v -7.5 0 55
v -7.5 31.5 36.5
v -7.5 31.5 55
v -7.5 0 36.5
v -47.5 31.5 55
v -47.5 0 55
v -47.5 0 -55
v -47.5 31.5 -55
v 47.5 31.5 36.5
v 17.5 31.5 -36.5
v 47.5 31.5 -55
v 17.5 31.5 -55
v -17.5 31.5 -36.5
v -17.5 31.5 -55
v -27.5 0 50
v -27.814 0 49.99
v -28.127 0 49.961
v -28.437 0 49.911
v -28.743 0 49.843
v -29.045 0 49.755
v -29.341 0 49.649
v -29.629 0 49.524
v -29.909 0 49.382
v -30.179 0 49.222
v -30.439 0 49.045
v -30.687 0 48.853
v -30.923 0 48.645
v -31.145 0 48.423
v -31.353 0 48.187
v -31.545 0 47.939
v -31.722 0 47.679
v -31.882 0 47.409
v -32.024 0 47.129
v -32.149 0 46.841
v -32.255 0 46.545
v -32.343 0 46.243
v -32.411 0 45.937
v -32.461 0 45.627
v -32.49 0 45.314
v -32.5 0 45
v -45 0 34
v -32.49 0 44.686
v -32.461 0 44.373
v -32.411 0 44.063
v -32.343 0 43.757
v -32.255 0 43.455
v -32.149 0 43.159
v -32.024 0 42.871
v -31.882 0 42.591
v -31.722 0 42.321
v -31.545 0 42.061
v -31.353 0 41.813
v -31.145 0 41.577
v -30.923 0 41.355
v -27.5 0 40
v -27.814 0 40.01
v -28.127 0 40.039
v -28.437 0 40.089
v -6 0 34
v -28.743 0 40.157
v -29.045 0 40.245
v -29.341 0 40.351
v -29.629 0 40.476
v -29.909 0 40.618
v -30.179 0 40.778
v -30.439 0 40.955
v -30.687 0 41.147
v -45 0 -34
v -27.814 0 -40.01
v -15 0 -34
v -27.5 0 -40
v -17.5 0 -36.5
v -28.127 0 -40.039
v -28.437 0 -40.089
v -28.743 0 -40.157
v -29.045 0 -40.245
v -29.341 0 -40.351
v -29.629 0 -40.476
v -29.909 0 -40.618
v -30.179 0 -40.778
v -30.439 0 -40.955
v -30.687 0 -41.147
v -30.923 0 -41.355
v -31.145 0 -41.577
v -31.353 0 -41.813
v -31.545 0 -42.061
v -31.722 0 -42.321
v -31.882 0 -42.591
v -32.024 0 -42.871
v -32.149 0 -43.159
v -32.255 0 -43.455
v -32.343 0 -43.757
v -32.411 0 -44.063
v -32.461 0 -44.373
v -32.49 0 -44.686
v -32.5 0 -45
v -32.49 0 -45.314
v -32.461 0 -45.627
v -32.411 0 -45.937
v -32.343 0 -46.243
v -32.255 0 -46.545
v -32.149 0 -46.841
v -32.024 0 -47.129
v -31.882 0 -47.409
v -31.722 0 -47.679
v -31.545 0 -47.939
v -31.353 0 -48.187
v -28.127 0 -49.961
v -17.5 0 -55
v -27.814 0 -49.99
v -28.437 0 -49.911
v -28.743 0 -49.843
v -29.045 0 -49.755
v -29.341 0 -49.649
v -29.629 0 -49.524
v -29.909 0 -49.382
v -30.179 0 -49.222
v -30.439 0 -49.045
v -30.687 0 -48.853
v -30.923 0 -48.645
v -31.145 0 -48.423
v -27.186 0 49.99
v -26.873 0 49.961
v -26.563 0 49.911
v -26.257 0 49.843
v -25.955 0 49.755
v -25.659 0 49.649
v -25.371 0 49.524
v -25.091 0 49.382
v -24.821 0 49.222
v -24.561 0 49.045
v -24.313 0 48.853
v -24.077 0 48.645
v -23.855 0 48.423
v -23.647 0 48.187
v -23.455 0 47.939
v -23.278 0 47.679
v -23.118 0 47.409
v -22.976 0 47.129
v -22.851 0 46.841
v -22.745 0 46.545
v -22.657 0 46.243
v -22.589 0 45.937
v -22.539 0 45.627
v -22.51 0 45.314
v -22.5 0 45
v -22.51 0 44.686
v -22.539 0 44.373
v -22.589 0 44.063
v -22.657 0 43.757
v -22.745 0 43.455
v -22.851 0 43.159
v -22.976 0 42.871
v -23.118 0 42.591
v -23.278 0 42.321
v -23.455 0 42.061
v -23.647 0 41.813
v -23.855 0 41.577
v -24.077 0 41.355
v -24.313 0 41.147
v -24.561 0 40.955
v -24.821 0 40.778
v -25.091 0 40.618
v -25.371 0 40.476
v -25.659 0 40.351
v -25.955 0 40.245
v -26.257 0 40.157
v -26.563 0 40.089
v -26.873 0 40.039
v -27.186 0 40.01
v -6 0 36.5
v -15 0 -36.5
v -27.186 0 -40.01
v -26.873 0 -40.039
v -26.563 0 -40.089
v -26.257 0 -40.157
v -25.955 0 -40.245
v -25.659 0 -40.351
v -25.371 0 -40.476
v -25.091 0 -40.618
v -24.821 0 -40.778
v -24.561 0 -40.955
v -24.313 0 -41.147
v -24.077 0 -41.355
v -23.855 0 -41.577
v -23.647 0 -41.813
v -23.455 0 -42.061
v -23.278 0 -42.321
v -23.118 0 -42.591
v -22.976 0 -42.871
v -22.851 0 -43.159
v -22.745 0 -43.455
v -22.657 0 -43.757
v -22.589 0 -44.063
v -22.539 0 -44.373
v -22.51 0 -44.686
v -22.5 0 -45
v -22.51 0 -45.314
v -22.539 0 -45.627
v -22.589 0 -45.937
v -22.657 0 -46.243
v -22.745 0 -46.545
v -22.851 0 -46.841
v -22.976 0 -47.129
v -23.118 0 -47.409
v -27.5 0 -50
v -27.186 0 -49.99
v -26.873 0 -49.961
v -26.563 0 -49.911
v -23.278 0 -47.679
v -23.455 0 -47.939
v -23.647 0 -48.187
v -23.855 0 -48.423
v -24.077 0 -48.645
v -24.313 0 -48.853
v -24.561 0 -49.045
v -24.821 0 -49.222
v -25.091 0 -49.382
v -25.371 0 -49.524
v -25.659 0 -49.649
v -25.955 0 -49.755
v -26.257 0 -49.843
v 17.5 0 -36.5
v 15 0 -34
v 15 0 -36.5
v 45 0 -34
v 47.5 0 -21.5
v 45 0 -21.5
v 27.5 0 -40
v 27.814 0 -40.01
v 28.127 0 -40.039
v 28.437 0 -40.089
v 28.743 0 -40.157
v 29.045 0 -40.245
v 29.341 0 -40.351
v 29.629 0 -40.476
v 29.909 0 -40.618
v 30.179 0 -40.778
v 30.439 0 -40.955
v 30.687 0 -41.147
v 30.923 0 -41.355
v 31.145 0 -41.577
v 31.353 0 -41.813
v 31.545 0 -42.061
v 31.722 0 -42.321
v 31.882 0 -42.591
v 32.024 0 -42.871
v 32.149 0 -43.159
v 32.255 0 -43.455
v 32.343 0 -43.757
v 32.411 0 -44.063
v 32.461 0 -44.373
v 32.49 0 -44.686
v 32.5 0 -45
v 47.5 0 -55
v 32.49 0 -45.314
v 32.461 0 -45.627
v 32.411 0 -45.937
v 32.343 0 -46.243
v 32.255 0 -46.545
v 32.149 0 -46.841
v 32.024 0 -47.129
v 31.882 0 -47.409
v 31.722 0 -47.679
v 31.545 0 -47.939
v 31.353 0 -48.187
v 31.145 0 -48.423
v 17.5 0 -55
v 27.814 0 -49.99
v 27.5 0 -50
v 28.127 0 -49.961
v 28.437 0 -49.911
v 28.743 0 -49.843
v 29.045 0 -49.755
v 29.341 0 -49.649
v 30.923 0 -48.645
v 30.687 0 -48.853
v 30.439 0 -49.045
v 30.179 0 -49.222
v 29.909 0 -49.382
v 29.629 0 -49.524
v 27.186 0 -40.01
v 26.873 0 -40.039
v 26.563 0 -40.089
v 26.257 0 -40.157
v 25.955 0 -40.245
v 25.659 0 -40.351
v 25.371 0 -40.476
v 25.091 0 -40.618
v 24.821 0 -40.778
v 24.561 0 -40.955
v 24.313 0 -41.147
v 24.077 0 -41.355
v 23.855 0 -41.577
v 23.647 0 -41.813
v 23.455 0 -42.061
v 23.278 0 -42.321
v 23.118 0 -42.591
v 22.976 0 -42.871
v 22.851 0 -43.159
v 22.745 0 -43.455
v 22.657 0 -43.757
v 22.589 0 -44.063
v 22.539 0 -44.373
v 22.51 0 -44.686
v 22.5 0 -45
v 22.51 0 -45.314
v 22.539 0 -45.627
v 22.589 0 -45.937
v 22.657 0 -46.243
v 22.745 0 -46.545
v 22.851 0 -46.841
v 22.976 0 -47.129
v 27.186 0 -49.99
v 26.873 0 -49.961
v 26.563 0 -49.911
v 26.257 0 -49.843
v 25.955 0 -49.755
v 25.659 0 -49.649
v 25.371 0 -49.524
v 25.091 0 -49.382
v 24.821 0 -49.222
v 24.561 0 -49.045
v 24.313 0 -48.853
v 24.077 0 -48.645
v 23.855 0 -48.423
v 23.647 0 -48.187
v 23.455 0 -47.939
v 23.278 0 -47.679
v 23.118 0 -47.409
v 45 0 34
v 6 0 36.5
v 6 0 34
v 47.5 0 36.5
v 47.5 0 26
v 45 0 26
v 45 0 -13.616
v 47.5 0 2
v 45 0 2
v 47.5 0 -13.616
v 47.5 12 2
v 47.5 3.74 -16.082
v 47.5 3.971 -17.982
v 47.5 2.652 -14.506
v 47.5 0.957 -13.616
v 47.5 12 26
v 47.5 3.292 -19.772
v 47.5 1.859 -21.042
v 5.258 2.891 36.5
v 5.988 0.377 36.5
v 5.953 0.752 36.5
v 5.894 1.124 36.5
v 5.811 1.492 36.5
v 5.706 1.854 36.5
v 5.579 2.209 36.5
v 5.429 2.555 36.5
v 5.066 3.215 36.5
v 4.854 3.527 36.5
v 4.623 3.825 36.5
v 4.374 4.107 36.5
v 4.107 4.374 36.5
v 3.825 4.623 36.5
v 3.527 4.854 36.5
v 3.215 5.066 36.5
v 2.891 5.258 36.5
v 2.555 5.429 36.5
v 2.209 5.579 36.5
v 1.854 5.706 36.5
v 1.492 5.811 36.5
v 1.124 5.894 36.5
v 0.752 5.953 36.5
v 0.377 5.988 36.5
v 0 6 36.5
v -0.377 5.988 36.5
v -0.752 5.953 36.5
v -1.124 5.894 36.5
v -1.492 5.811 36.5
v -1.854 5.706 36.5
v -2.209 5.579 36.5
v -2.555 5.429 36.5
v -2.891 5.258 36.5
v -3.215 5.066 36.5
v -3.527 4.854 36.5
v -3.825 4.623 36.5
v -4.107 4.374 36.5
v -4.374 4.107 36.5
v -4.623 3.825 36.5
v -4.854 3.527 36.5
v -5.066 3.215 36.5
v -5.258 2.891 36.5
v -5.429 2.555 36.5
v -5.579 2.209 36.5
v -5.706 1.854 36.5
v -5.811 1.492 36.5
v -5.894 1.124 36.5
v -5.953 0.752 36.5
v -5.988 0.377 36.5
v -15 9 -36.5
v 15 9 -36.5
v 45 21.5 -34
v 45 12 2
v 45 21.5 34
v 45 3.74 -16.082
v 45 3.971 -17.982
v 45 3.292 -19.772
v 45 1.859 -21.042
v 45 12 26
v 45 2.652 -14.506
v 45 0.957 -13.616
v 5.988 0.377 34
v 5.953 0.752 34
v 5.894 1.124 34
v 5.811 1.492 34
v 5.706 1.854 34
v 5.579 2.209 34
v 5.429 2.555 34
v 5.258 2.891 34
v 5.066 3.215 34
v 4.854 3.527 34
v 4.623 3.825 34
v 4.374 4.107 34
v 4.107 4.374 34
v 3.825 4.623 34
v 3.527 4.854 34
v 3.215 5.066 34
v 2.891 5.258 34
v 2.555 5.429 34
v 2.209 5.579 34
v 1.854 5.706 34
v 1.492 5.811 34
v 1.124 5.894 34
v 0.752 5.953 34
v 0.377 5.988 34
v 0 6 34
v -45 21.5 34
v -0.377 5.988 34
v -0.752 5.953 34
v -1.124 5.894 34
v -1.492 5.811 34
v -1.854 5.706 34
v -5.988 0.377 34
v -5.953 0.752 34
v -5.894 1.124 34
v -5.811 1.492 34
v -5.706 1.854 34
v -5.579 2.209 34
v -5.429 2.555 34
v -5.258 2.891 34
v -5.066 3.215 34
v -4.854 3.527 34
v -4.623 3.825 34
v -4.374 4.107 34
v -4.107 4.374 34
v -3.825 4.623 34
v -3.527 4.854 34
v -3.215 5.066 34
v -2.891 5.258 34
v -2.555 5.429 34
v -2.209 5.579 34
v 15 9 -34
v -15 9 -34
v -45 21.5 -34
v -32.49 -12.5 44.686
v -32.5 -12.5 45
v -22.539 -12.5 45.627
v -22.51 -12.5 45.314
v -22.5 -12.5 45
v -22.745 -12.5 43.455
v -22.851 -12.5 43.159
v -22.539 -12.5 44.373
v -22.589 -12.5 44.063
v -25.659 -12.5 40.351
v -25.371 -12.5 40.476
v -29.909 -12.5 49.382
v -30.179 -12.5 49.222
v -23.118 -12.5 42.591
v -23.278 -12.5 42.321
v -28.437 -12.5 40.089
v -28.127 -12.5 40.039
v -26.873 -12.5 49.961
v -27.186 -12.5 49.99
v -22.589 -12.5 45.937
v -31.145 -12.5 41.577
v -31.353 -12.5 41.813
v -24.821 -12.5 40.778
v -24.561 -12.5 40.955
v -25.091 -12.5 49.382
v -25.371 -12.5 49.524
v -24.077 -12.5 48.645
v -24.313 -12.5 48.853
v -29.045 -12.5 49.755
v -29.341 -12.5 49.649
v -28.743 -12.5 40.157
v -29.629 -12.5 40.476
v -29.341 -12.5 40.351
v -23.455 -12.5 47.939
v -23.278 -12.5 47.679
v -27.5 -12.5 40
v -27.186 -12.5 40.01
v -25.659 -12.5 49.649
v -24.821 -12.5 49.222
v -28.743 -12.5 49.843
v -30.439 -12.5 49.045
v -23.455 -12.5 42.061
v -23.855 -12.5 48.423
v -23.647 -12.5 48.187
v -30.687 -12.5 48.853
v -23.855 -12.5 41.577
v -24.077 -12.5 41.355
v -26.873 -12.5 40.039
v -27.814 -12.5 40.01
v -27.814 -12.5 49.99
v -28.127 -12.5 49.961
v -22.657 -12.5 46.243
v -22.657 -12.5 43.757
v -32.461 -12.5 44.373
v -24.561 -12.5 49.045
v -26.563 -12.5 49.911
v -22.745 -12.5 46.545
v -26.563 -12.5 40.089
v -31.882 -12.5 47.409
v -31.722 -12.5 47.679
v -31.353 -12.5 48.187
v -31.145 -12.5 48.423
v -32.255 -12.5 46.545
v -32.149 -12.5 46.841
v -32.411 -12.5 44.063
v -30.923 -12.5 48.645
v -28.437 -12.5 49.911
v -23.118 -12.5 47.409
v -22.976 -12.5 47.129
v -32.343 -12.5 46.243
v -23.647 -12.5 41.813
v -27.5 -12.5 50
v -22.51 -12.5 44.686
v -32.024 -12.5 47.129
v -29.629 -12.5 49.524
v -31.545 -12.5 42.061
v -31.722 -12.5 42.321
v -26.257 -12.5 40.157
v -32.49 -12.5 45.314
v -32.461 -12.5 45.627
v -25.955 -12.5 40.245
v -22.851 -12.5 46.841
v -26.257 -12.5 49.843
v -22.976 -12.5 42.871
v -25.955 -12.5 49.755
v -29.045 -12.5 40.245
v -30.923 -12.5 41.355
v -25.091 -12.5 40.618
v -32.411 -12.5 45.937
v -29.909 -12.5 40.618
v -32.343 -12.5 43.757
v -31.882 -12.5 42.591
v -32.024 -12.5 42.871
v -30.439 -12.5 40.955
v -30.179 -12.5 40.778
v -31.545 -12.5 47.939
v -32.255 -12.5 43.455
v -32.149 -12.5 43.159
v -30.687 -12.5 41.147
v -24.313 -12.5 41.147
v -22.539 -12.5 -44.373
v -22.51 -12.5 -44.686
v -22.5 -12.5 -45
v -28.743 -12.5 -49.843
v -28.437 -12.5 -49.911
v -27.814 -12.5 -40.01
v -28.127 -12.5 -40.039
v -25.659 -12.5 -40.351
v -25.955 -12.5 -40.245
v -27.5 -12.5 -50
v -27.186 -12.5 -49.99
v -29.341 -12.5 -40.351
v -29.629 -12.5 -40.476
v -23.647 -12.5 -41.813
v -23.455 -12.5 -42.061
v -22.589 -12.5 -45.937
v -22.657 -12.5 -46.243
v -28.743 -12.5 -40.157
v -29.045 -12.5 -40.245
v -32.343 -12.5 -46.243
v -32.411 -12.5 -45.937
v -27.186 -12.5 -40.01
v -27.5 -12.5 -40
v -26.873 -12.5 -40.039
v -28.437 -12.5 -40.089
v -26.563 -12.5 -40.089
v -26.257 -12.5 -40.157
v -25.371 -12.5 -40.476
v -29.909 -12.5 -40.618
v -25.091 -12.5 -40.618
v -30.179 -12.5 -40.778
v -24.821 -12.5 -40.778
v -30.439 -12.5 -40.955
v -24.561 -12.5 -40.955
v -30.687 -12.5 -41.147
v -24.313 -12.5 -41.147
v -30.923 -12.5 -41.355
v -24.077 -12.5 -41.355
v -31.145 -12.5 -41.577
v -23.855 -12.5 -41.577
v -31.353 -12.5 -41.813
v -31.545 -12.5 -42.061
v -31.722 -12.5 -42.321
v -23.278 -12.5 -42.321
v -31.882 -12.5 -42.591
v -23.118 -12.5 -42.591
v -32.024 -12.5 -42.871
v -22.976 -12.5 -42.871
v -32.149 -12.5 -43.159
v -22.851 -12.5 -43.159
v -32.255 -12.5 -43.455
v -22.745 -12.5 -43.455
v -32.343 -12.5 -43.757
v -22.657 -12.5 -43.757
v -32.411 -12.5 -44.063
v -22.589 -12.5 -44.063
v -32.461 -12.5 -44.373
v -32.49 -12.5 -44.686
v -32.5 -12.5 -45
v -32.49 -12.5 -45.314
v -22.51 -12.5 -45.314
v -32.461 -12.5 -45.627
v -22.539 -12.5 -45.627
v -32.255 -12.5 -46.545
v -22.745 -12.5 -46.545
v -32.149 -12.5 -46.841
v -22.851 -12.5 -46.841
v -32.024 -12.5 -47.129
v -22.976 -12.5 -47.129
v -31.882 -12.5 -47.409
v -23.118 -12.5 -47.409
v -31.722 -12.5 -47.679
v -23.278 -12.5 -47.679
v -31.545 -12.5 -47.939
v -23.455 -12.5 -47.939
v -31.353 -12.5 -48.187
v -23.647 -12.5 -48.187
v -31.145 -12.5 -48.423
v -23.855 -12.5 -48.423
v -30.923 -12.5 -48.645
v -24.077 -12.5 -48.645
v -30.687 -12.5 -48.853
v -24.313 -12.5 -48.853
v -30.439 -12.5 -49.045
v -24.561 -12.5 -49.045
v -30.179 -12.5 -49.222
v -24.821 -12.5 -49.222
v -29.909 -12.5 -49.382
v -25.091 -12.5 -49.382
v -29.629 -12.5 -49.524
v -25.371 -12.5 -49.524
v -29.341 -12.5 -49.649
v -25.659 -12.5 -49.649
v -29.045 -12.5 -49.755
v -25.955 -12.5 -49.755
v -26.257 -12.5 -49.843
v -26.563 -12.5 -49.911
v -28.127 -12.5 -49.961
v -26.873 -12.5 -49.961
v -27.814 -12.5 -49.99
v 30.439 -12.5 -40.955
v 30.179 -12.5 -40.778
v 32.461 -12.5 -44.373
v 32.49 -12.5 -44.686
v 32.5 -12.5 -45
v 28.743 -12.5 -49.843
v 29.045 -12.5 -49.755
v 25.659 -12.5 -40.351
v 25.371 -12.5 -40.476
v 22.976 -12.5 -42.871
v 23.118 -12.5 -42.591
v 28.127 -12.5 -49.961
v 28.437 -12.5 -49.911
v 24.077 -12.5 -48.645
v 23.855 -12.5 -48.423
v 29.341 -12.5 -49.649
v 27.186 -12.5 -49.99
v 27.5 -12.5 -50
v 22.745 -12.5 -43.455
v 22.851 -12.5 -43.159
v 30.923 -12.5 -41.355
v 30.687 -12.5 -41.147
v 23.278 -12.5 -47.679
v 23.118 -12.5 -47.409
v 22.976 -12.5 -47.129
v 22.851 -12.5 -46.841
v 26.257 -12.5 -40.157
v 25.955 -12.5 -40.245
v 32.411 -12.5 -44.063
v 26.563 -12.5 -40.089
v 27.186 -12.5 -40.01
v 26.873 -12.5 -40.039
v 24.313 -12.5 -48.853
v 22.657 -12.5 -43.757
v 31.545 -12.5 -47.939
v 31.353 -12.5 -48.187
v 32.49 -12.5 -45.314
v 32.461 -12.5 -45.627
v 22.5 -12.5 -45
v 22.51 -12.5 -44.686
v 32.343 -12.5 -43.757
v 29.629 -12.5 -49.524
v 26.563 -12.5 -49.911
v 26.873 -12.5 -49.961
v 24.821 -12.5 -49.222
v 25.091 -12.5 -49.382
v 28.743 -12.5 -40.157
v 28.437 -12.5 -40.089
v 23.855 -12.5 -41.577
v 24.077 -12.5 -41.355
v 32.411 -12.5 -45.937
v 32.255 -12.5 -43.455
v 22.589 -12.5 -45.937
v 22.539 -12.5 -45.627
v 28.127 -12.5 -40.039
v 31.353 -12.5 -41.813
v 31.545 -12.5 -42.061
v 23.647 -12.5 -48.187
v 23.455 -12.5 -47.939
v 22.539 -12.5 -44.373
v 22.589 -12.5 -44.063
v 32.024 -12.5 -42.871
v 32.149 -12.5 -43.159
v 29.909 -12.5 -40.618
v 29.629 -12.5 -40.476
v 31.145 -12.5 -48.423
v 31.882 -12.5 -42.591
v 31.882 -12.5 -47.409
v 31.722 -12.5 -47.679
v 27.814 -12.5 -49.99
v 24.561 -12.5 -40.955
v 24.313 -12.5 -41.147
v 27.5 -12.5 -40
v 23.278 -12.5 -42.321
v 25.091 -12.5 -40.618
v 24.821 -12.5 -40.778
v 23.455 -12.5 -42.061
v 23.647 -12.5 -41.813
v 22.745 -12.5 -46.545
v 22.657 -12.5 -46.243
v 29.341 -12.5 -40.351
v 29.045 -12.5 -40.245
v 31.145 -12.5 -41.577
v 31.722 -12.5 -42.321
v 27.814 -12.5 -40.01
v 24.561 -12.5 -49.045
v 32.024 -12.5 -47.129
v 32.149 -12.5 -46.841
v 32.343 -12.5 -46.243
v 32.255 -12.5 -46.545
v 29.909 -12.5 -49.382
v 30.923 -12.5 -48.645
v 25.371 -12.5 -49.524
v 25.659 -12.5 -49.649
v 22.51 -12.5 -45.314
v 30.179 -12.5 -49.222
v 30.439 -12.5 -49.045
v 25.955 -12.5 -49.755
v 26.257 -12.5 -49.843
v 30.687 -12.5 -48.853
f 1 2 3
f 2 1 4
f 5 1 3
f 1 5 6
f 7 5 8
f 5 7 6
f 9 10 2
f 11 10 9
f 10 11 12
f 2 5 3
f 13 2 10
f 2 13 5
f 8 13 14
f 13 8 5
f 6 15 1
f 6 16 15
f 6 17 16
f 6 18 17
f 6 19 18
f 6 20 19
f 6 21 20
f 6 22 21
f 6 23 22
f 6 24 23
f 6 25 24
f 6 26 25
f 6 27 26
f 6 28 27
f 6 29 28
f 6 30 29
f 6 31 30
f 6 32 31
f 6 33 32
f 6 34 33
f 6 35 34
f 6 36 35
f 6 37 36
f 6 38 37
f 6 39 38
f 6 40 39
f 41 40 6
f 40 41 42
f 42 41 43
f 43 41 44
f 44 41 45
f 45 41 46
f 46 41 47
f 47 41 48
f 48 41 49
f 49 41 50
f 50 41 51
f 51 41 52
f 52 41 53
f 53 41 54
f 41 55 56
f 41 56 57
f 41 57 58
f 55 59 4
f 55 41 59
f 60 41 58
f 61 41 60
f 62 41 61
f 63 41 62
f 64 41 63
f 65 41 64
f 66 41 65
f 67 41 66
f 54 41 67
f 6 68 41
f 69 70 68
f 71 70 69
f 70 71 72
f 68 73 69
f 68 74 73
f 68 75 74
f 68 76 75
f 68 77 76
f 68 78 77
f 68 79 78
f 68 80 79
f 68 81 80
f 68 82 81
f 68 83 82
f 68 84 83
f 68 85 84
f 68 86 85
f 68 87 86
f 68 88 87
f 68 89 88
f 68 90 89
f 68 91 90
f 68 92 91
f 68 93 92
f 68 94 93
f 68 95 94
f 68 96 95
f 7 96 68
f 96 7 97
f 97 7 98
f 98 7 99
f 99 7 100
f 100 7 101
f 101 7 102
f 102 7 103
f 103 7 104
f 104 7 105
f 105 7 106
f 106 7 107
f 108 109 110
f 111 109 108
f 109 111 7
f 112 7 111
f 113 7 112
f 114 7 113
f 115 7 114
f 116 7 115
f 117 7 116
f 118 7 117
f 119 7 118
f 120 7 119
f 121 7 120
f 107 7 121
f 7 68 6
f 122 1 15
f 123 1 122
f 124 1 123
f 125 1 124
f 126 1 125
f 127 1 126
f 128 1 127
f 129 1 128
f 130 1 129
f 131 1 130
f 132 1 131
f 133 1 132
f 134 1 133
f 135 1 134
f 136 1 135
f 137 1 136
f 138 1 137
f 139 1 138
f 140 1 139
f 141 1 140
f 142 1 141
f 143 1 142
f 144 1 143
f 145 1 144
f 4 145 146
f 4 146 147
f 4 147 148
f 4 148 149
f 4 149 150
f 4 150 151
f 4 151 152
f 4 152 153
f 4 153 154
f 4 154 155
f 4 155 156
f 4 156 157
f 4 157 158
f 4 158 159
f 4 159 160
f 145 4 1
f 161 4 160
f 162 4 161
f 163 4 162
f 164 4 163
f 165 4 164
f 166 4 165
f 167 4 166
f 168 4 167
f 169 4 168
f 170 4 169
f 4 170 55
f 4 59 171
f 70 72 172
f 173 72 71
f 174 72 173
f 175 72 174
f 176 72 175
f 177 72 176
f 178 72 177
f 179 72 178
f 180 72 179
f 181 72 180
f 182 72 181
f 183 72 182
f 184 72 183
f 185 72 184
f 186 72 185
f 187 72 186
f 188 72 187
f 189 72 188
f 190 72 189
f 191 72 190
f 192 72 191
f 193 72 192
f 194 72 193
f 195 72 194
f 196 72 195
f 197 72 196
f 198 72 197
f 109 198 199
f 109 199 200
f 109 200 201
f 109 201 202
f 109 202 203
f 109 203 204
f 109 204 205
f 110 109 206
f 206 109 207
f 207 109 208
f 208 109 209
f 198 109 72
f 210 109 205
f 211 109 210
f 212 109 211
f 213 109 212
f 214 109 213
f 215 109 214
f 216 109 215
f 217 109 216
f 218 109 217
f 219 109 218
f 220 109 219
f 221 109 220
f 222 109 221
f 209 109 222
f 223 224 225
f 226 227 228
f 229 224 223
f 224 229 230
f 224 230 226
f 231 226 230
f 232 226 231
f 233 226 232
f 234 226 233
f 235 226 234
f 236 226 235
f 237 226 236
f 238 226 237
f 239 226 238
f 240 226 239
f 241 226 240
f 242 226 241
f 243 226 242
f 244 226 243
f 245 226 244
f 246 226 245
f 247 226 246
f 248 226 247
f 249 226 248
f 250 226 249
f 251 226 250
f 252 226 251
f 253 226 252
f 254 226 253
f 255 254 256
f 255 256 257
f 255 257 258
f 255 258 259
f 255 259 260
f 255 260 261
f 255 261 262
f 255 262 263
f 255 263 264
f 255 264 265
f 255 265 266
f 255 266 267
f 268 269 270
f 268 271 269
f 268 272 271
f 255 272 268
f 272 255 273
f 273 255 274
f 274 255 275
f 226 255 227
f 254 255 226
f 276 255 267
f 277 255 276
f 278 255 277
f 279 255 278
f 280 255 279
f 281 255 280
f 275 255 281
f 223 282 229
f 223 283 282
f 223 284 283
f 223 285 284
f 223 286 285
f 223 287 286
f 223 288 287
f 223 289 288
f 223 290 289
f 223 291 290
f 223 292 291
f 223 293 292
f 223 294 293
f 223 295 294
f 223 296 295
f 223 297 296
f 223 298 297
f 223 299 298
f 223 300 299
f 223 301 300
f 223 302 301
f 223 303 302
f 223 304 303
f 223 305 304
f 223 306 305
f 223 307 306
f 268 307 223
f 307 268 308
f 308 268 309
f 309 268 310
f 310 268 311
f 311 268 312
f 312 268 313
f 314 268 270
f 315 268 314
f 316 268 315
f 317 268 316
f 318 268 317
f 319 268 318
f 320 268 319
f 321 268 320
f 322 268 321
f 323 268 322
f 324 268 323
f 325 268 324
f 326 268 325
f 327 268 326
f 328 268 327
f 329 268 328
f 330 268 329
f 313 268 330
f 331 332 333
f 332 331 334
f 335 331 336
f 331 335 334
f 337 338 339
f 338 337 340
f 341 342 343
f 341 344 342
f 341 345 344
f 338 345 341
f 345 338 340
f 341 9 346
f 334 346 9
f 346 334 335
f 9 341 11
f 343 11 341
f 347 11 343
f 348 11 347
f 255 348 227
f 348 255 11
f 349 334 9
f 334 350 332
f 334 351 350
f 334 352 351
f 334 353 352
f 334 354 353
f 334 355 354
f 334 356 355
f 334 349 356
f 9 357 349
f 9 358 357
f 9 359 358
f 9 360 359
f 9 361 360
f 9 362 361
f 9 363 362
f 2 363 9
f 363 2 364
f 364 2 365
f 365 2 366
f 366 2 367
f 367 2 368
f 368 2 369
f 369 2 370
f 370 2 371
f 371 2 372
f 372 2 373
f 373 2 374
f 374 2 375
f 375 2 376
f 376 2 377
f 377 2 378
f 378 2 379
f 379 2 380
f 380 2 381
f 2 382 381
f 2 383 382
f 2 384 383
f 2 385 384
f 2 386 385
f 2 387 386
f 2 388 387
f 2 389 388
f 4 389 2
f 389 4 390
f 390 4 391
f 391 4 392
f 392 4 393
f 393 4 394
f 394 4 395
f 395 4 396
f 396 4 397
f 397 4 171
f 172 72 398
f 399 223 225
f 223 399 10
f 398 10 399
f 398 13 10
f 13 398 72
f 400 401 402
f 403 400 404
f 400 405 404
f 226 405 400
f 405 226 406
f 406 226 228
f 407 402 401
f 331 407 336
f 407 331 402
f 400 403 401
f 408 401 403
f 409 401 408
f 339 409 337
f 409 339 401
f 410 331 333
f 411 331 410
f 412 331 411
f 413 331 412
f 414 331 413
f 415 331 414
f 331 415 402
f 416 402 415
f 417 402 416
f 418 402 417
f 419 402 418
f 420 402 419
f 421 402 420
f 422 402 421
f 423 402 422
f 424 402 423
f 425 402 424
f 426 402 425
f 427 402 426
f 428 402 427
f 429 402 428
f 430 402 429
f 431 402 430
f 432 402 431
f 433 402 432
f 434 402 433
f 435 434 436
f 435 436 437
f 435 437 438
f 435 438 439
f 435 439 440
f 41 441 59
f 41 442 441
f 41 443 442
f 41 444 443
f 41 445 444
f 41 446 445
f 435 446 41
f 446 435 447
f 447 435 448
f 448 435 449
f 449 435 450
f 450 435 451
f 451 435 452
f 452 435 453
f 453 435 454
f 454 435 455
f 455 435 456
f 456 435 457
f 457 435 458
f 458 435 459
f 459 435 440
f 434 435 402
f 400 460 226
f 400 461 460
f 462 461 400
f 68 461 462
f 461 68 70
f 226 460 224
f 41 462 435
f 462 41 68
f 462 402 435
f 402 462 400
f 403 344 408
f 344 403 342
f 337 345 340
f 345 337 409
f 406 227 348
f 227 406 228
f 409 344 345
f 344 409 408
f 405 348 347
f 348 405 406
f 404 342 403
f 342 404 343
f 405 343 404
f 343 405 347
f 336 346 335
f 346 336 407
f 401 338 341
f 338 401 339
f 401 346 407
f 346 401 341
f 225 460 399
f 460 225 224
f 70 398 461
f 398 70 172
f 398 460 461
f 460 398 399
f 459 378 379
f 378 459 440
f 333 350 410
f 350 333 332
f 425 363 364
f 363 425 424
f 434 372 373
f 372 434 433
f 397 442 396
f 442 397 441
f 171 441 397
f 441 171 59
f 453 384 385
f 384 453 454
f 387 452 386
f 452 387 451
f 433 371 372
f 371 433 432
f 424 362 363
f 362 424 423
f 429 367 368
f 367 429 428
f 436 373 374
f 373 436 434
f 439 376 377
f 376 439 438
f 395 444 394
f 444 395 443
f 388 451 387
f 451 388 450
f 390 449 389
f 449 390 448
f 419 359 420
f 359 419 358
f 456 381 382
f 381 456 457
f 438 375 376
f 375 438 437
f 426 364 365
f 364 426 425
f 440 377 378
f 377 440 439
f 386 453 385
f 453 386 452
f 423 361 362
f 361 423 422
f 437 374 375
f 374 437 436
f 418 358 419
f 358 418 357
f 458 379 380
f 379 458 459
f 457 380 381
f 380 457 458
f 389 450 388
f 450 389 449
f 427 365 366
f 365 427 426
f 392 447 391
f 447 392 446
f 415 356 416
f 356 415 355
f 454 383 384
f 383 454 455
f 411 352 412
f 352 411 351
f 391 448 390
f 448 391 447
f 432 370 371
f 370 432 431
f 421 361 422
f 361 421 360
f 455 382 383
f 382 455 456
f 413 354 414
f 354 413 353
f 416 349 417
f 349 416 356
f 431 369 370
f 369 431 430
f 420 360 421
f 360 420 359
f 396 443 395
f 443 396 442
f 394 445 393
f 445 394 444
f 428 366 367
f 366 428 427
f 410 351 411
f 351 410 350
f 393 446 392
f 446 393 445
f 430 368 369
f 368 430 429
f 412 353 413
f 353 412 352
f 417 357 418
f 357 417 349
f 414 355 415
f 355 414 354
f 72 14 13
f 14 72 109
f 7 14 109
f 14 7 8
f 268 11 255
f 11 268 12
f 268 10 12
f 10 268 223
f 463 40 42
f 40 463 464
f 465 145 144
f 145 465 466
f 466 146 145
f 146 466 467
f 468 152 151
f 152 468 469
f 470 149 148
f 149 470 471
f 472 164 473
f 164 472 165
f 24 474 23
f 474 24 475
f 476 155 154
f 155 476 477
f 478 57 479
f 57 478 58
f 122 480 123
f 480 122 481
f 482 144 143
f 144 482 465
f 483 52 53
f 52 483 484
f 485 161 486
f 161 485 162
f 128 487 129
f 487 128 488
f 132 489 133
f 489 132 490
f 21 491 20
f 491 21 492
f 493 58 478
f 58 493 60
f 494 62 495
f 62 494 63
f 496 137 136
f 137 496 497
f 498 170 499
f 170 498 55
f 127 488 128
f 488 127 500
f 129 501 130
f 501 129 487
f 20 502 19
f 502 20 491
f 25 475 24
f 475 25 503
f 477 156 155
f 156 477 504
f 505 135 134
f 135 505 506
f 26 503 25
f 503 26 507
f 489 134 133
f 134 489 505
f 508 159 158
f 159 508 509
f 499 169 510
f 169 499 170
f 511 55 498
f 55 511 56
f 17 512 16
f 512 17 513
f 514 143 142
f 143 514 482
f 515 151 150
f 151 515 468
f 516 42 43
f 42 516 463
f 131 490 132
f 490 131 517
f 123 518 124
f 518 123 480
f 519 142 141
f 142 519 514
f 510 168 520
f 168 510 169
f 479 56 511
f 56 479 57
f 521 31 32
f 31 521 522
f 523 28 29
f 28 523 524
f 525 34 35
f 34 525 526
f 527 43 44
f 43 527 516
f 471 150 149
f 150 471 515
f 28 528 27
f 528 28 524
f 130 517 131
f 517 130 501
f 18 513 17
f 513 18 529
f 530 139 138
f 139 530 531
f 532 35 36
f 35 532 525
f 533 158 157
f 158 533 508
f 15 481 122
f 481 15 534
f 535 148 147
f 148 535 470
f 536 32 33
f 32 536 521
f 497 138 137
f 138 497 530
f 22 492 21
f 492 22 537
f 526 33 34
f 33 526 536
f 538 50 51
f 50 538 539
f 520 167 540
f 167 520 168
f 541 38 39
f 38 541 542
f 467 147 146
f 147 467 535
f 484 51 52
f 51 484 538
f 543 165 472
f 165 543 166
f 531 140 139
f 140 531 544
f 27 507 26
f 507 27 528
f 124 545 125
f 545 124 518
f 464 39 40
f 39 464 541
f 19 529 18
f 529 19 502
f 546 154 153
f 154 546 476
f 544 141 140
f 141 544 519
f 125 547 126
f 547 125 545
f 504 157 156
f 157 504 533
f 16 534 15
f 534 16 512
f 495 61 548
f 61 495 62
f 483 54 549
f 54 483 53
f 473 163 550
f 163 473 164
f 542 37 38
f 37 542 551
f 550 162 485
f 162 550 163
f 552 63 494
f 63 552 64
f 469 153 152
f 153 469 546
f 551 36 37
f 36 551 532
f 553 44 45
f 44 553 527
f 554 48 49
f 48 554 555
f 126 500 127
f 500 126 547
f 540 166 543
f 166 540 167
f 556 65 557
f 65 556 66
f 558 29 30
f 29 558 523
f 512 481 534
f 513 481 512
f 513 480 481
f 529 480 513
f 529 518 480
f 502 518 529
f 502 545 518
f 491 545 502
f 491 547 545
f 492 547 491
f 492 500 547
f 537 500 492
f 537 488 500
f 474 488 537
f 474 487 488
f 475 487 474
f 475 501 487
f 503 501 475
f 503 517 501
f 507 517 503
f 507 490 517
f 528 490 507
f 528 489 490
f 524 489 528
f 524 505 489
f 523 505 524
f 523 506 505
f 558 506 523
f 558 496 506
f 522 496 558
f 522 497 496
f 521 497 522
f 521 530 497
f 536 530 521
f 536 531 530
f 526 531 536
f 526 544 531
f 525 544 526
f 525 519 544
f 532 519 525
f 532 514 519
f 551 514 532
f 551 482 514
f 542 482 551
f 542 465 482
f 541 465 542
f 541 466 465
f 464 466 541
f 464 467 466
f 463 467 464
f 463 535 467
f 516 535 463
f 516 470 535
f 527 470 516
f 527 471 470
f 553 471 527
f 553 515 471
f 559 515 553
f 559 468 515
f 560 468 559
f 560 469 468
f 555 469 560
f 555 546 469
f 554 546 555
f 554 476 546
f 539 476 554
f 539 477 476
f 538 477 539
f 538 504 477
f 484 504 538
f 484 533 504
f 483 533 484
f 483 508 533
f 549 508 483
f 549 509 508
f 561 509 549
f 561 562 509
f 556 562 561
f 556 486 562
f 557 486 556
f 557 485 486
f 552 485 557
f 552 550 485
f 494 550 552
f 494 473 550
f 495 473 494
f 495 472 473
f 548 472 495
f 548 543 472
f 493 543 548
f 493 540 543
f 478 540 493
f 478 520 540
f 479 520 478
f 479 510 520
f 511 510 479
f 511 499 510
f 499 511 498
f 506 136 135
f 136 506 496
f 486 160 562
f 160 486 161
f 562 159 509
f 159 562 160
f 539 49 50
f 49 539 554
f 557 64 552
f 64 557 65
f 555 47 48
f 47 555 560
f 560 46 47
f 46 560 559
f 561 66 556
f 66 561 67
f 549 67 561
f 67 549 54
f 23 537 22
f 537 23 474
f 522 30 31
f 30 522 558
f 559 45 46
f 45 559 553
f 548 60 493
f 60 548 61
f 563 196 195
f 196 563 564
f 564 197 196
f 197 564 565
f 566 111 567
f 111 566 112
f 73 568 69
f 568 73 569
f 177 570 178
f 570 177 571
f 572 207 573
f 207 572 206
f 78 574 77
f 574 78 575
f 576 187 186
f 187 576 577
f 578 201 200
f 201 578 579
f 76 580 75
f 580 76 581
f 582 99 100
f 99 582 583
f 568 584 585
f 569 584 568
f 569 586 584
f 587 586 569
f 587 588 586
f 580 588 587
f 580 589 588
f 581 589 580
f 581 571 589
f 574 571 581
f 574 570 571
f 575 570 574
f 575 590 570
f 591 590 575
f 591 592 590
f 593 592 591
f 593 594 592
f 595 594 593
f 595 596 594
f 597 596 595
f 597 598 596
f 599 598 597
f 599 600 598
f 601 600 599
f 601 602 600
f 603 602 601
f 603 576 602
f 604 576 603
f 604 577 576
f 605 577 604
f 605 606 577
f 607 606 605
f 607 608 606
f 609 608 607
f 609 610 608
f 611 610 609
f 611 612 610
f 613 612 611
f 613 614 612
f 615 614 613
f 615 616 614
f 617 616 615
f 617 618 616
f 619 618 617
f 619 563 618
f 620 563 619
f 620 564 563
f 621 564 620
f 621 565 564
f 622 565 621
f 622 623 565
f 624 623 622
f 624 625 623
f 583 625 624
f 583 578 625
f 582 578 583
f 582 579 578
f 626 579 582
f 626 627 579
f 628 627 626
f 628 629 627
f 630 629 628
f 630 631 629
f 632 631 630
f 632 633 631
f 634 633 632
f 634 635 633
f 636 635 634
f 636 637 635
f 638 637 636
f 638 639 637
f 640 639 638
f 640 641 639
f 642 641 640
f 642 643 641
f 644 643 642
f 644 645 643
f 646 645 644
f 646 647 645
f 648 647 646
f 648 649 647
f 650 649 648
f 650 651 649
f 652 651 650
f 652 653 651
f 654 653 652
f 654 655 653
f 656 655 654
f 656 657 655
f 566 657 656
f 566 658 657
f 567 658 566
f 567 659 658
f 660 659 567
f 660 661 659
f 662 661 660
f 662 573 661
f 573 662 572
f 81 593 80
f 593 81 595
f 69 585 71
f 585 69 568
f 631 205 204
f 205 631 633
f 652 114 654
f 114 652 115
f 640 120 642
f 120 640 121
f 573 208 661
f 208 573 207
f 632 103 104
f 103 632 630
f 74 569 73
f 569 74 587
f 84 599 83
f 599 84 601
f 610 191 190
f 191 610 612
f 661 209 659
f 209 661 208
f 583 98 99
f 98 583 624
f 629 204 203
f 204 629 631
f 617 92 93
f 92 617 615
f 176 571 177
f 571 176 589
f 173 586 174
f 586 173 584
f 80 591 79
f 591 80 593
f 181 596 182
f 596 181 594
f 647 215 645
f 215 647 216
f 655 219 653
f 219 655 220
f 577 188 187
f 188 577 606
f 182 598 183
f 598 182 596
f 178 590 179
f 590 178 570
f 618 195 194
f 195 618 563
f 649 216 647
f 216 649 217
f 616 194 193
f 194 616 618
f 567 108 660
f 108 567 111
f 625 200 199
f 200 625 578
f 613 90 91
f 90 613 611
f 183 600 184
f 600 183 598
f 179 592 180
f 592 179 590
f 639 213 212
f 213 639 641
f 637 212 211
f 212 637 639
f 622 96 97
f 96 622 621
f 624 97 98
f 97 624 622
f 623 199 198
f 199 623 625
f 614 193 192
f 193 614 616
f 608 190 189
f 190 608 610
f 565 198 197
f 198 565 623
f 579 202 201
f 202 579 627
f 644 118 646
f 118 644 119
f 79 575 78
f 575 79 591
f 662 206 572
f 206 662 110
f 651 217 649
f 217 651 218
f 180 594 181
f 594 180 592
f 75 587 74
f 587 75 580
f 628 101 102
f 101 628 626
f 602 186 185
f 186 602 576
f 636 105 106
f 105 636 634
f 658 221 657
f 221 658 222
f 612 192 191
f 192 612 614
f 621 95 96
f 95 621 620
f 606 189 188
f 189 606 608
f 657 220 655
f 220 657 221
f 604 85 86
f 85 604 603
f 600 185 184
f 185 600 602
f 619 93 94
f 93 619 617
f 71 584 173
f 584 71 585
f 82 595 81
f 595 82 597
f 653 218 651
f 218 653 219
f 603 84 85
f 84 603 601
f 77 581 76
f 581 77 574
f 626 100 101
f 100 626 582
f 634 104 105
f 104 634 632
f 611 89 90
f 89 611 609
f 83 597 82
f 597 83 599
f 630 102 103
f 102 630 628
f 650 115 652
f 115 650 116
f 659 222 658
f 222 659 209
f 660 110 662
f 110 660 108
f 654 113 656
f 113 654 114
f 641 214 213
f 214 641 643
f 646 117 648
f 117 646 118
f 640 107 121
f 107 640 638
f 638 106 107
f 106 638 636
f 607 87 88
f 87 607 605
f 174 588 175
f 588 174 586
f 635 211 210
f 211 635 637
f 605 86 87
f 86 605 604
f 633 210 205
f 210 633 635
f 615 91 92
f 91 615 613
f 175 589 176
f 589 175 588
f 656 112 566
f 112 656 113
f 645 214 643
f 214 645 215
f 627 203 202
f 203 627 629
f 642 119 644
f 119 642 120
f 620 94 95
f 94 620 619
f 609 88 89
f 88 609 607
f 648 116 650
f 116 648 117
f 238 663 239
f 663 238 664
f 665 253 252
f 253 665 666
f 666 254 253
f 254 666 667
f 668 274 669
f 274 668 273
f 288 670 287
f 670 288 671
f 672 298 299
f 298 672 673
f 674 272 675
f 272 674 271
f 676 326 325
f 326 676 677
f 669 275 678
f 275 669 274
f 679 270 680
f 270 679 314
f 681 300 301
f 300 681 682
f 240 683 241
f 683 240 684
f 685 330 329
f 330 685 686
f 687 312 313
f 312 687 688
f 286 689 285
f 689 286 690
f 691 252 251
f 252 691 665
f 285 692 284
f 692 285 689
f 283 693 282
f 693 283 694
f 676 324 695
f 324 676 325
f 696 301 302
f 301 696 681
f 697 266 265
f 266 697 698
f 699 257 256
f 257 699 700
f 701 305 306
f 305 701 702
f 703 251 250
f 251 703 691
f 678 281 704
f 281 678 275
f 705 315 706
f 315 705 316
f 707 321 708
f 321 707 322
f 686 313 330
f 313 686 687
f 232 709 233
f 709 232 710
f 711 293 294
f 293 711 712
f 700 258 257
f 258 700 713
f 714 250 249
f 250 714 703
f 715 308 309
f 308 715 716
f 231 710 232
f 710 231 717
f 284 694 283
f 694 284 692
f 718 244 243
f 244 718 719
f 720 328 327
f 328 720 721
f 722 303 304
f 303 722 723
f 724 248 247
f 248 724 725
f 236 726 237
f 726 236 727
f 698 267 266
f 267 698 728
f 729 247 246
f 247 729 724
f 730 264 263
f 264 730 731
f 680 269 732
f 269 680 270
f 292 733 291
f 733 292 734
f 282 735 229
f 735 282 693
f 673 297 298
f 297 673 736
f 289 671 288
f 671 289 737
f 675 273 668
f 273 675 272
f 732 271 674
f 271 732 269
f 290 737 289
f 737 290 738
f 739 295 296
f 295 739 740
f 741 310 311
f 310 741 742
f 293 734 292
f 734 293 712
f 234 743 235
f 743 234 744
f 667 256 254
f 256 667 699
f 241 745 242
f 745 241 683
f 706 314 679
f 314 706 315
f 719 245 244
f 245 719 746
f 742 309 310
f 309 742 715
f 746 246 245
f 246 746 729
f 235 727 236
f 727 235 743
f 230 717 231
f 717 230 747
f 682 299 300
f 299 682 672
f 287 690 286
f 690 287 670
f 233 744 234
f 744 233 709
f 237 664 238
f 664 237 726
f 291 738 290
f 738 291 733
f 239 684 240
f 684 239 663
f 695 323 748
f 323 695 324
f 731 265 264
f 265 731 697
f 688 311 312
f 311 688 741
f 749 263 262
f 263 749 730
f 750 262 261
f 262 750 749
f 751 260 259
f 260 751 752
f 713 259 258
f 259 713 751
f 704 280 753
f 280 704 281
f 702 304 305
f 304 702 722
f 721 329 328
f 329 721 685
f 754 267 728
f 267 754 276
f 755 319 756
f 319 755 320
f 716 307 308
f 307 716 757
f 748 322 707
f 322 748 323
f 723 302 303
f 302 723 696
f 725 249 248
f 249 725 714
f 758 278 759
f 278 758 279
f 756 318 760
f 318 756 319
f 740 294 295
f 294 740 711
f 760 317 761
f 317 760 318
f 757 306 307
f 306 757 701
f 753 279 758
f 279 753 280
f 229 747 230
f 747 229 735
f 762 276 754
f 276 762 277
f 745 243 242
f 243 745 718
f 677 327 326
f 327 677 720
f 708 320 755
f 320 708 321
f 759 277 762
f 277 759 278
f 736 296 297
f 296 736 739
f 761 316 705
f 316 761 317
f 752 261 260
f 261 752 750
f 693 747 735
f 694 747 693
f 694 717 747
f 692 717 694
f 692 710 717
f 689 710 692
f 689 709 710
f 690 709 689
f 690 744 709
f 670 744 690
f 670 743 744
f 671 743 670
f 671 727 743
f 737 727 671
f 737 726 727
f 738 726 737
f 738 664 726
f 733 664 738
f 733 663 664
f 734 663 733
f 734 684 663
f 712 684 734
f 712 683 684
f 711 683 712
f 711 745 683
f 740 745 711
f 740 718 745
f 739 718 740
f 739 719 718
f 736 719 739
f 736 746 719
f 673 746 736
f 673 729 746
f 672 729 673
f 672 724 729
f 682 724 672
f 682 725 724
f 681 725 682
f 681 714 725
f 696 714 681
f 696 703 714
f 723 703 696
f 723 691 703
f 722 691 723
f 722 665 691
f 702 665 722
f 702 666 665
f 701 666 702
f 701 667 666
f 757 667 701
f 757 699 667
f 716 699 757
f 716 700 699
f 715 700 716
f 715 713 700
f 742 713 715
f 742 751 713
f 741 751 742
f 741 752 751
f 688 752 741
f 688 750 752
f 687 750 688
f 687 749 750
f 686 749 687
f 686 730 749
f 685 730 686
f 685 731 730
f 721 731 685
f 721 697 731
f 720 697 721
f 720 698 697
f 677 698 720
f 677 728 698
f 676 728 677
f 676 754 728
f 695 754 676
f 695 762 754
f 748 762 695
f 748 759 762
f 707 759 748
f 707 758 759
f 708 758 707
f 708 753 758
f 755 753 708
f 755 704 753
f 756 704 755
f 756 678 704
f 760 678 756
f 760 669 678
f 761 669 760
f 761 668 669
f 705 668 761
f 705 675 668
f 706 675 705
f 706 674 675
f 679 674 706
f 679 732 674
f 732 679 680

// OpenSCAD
length = 90;
width = 43;
height = 68;

union(){
difference(){
    translate([-((length+20)/4),(width+10)/4,(height)/2+11]) cube([(length-10)/2,(width+30)/2,20],center=true);
    translate([0,-(width)/2,0]) cube([length+25,width,height+50],center = true);
    
}

difference(){
    cube([length+5,width+20,height+5],center = true);
    cube([length,width,height],center = true);
    translate([0,0,-17.5]) rotate([0,90,0]) cylinder(h=height,r=4);
    translate([0,-(width)/2,0]) cube([length+25,width,height+50],center = true,$fn=100);
    translate([45,0,14]) cube(24,center = true);
    translate([0,0,-20]) cube([30,18,height],center=true);
    translate([0,0,20]) rotate ([0,0,90]) cylinder (h = width+10, r=6, center = true,$fn=100);
    translate([20,-22,-9]) cube([25,20,10], center=true, $fn=100);
}
translate([-((length+20)/4),0,(height)/2+11]) rotate ([90,0,0]) cylinder (h = 25, r=5, center = true, $fn=100);

difference(){
    translate([-((length+40)/4),(width+10)/4,-((height)/2+11)]) cube([(length-30)/2,(width+30)/2,20],center=true);
    translate([0,-(width)/2,0]) cube([length+25,width,height+50],center = true);  
}

translate([-((length+20)/4),0,-((height)/2+11)]) rotate ([90,0,0]) cylinder (h = 25, r=5, center = true, $fn=100);

difference(){
    translate([((length+40)/4),(width+10)/4,-((height)/2+11)]) cube([(length-30)/2,(width+30)/2,20],center=true);
    translate([0,-(width)/2,0]) cube([length+25,width,height+50],center = true);  
}

translate([((length+20)/4),0,-((height)/2+11)]) rotate ([90,0,0]) cylinder (h = 25, r=5, center = true, $fn=100);
}
